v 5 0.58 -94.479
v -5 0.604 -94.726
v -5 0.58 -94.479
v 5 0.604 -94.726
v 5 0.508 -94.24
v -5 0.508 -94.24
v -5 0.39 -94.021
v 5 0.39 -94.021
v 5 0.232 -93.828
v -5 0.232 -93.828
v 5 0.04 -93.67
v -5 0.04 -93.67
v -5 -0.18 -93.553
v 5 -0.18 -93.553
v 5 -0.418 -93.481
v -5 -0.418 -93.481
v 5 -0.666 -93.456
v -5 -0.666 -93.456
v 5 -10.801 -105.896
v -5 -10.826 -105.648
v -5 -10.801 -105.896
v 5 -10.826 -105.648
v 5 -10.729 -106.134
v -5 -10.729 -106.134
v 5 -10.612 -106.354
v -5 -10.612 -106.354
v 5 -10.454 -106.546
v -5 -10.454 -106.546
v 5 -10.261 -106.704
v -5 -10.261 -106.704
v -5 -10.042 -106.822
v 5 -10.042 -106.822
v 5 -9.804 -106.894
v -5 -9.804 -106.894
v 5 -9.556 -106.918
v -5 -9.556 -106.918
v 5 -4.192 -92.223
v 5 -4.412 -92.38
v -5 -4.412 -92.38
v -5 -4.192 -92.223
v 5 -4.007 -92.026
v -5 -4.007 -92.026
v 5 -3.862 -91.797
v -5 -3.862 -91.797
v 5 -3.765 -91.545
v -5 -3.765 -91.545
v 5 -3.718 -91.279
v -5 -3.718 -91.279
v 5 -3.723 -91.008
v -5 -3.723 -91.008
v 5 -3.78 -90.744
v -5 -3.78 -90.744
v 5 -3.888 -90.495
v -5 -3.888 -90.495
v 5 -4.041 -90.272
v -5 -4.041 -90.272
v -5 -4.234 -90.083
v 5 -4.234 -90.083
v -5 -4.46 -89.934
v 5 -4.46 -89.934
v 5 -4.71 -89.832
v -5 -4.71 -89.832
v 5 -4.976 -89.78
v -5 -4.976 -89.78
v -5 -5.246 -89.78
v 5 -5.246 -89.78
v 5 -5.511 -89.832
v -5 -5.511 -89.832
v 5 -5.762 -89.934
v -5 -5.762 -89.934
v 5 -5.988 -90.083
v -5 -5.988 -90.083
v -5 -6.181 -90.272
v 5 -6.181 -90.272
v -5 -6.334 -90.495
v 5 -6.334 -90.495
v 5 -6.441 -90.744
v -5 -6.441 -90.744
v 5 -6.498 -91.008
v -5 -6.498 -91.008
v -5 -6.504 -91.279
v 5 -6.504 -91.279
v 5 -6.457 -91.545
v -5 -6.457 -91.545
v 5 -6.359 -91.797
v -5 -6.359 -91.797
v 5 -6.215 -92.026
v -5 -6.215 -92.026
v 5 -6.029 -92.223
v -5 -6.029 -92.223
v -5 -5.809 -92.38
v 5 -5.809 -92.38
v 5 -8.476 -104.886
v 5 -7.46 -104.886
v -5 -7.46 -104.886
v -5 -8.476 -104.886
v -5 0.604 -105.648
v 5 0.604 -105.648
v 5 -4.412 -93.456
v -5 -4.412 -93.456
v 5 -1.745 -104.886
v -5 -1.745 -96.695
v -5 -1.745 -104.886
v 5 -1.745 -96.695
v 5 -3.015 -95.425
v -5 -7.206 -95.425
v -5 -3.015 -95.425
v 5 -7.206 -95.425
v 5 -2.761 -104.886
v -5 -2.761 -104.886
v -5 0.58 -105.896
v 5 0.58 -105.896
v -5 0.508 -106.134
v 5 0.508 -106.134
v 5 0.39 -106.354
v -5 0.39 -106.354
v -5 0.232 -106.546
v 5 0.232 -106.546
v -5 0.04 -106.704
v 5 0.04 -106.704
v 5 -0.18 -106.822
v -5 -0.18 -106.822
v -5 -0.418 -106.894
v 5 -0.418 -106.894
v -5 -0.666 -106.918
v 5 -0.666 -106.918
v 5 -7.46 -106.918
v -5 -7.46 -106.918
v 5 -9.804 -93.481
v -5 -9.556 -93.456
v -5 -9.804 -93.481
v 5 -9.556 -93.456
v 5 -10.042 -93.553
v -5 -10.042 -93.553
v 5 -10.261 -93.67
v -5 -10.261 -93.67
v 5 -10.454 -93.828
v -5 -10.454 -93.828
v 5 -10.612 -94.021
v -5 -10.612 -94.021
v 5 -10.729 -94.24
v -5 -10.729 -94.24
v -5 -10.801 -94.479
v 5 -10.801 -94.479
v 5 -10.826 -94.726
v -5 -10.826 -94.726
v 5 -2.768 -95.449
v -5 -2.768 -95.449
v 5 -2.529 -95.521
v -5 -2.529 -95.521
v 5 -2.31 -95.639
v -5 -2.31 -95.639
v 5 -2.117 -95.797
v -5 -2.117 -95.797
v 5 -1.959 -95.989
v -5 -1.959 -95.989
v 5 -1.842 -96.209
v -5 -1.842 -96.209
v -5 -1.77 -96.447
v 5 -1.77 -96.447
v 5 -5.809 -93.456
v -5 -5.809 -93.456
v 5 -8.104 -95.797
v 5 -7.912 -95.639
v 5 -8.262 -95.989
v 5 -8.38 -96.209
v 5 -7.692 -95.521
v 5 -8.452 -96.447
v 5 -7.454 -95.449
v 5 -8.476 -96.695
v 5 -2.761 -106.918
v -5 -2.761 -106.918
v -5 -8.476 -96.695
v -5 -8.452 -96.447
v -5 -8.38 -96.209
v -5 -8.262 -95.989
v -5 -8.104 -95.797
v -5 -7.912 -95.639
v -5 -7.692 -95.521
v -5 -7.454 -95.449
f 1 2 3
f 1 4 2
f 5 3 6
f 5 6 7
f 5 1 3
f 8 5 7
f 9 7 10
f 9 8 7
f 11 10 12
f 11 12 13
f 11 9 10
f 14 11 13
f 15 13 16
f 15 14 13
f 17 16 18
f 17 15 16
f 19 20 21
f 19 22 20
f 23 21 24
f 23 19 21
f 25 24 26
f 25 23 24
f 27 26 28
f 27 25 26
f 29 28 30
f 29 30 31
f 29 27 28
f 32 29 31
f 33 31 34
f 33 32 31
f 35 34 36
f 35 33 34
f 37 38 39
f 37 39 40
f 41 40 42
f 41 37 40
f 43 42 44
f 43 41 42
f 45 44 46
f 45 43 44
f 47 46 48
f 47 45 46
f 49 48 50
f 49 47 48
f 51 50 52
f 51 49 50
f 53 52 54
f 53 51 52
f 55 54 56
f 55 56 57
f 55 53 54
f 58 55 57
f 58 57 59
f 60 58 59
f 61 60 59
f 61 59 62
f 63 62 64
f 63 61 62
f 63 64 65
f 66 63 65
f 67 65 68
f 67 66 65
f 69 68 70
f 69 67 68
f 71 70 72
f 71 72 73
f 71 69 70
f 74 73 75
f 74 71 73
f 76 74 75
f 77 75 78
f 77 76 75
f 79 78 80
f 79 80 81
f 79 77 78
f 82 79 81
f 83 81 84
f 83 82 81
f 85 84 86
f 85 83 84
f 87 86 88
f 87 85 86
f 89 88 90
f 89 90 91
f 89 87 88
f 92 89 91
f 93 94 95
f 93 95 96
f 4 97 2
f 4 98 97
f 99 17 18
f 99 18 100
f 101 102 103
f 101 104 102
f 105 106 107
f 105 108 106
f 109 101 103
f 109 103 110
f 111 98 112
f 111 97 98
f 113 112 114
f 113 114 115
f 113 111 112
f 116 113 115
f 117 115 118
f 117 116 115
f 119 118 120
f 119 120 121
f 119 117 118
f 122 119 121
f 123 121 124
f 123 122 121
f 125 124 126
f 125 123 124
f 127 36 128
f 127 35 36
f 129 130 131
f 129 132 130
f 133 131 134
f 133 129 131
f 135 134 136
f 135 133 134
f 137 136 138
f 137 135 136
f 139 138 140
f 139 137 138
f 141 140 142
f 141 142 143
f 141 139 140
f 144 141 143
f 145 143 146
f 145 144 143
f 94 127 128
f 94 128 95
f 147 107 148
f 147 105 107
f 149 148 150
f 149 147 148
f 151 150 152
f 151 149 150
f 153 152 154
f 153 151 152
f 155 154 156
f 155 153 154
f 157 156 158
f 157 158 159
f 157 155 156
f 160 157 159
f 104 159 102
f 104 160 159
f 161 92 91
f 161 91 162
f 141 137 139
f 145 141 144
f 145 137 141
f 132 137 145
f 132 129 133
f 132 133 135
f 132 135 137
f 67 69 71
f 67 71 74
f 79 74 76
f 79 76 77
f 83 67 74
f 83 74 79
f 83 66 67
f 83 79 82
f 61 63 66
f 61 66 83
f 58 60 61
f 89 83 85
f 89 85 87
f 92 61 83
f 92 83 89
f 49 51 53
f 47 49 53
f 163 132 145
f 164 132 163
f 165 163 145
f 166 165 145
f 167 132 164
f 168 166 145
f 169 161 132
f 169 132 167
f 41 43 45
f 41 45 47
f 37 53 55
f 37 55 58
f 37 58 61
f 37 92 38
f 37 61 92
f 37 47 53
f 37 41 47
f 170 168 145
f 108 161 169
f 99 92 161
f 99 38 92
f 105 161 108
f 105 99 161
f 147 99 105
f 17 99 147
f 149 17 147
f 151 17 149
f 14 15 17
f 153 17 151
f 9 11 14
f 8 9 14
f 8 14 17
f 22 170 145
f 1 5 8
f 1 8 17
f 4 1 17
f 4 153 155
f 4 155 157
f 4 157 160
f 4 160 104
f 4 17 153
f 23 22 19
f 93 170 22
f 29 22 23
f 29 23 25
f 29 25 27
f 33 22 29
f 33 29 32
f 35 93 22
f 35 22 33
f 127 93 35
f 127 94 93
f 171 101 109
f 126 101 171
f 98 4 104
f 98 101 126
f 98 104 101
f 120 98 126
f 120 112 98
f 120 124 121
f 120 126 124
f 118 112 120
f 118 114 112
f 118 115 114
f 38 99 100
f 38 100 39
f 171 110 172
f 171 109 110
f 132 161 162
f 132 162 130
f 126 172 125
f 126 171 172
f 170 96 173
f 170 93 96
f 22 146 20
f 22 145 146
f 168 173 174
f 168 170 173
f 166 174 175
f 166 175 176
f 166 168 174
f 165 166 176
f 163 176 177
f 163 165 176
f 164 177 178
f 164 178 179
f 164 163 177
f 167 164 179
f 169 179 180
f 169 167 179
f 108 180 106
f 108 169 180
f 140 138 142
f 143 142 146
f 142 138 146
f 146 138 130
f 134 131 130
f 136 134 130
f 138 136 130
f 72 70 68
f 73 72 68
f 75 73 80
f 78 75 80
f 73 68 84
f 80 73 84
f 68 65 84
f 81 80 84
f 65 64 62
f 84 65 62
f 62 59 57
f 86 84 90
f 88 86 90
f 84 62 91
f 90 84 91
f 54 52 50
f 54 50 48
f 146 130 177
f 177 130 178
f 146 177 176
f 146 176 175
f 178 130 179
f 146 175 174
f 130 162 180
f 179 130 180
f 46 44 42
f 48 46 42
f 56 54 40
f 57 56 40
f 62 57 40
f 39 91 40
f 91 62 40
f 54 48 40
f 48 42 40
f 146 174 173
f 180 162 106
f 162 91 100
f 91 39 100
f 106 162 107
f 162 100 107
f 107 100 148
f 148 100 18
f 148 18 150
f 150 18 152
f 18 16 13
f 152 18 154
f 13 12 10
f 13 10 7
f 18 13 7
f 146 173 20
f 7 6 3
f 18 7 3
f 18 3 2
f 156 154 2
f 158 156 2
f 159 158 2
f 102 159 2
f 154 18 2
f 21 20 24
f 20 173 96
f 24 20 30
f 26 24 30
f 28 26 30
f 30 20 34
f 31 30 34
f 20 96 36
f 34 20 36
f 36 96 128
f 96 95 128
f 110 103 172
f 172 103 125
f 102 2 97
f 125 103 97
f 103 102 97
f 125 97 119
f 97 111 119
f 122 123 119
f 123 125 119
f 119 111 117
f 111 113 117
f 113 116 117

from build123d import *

# Parameters (mm, degrees)
MAINBODY_DEPTH      = 5
BOSS_EXTRUDE4_DEPTH = 10
FILLET4_R           = 1.27


with BuildPart() as part:
    # Sketch1 → MainBody (new, symmetric)
    with BuildSketch(Plane(origin=(0, 0, 0), x_dir=(0, 0, -1), z_dir=(1, 0, 0))):
        Polygon((106.918290099, 0.604217668), (93.456290099, 0.604217668), (93.456290099, -10.825782332), (106.918290099, -10.825782332), (106.918290099, -7.460282332), (104.886290099, -7.460282332), (104.886290099, -8.476282332), (95.424790099, -8.476282332), (95.424790099, -1.745282332), (104.886290099, -1.745282332), (104.886290099, -2.761282332), (106.918290099, -2.761282332), align=None)
    extrude(amount=MAINBODY_DEPTH, both=True)

    # Sketch10 → Boss-Extrude4 (add)
    with BuildSketch(Plane(origin=(5, 0, 0), x_dir=(0, 0, -1), z_dir=(1, 0, 0))):
        with BuildLine():
            Line((91.170290099, -5.809282332), (91.170290099, -5.110782332))
            Line((91.170290099, -5.110782332), (91.170290099, -4.412282332))
            Line((91.170290099, -4.412282332), (92.380127588, -4.412282332))
            ThreePointArc((92.380127588, -4.412282332), (89.773290099, -5.110782332), (92.380127588, -5.809282332))
            Line((92.380127588, -5.809282332), (91.170290099, -5.809282332))
        make_face()
        with BuildLine():
            Line((91.170290099, -4.412282332), (91.170290099, -5.110782332))
            Line((91.170290099, -5.110782332), (92.567290099, -5.110782332))
            ThreePointArc((92.567290099, -5.110782332), (92.519688478, -4.749212126), (92.380127588, -4.412282332))
            Line((92.380127588, -4.412282332), (91.170290099, -4.412282332))
        make_face()
        with BuildLine():
            Line((92.567290099, -5.110782332), (91.170290099, -5.110782332))
            Line((91.170290099, -5.110782332), (91.170290099, -5.809282332))
            Line((91.170290099, -5.809282332), (92.380127588, -5.809282332))
            ThreePointArc((92.380127588, -5.809282332), (92.519688478, -5.472352538), (92.567290099, -5.110782332))
        make_face()
        with BuildLine():
            ThreePointArc((92.380127588, -4.412282332), (92.519688478, -4.749212126), (92.567290099, -5.110782332))
            Line((92.567290099, -5.110782332), (93.456290099, -5.110782332))
            Line((93.456290099, -5.110782332), (93.456290099, -4.412282332))
            Line((93.456290099, -4.412282332), (92.380127588, -4.412282332))
        make_face()
        with BuildLine():
            Line((93.456290099, -5.110782332), (92.567290099, -5.110782332))
            ThreePointArc((92.567290099, -5.110782332), (92.519688478, -5.472352538), (92.380127588, -5.809282332))
            Line((92.380127588, -5.809282332), (93.456290099, -5.809282332))
            Line((93.456290099, -5.809282332), (93.456290099, -5.110782332))
        make_face()
    extrude(amount=-BOSS_EXTRUDE4_DEPTH)

    # Fillet4
    fillet4_edges = [part.edges().sort_by_distance(p)[0] for p in [
        (0, -1.745282332, -95.424790099),
        (0, -8.476282332, -95.424790099),
        (0, -10.825782332, -106.918290099),
        (0, -10.825782332, -93.456290099),
        (0, 0.604217668, -93.456290099),
        (0, 0.604217668, -106.918290099),
    ]]
    fillet(fillet4_edges, radius=FILLET4_R)


solid = part.part
